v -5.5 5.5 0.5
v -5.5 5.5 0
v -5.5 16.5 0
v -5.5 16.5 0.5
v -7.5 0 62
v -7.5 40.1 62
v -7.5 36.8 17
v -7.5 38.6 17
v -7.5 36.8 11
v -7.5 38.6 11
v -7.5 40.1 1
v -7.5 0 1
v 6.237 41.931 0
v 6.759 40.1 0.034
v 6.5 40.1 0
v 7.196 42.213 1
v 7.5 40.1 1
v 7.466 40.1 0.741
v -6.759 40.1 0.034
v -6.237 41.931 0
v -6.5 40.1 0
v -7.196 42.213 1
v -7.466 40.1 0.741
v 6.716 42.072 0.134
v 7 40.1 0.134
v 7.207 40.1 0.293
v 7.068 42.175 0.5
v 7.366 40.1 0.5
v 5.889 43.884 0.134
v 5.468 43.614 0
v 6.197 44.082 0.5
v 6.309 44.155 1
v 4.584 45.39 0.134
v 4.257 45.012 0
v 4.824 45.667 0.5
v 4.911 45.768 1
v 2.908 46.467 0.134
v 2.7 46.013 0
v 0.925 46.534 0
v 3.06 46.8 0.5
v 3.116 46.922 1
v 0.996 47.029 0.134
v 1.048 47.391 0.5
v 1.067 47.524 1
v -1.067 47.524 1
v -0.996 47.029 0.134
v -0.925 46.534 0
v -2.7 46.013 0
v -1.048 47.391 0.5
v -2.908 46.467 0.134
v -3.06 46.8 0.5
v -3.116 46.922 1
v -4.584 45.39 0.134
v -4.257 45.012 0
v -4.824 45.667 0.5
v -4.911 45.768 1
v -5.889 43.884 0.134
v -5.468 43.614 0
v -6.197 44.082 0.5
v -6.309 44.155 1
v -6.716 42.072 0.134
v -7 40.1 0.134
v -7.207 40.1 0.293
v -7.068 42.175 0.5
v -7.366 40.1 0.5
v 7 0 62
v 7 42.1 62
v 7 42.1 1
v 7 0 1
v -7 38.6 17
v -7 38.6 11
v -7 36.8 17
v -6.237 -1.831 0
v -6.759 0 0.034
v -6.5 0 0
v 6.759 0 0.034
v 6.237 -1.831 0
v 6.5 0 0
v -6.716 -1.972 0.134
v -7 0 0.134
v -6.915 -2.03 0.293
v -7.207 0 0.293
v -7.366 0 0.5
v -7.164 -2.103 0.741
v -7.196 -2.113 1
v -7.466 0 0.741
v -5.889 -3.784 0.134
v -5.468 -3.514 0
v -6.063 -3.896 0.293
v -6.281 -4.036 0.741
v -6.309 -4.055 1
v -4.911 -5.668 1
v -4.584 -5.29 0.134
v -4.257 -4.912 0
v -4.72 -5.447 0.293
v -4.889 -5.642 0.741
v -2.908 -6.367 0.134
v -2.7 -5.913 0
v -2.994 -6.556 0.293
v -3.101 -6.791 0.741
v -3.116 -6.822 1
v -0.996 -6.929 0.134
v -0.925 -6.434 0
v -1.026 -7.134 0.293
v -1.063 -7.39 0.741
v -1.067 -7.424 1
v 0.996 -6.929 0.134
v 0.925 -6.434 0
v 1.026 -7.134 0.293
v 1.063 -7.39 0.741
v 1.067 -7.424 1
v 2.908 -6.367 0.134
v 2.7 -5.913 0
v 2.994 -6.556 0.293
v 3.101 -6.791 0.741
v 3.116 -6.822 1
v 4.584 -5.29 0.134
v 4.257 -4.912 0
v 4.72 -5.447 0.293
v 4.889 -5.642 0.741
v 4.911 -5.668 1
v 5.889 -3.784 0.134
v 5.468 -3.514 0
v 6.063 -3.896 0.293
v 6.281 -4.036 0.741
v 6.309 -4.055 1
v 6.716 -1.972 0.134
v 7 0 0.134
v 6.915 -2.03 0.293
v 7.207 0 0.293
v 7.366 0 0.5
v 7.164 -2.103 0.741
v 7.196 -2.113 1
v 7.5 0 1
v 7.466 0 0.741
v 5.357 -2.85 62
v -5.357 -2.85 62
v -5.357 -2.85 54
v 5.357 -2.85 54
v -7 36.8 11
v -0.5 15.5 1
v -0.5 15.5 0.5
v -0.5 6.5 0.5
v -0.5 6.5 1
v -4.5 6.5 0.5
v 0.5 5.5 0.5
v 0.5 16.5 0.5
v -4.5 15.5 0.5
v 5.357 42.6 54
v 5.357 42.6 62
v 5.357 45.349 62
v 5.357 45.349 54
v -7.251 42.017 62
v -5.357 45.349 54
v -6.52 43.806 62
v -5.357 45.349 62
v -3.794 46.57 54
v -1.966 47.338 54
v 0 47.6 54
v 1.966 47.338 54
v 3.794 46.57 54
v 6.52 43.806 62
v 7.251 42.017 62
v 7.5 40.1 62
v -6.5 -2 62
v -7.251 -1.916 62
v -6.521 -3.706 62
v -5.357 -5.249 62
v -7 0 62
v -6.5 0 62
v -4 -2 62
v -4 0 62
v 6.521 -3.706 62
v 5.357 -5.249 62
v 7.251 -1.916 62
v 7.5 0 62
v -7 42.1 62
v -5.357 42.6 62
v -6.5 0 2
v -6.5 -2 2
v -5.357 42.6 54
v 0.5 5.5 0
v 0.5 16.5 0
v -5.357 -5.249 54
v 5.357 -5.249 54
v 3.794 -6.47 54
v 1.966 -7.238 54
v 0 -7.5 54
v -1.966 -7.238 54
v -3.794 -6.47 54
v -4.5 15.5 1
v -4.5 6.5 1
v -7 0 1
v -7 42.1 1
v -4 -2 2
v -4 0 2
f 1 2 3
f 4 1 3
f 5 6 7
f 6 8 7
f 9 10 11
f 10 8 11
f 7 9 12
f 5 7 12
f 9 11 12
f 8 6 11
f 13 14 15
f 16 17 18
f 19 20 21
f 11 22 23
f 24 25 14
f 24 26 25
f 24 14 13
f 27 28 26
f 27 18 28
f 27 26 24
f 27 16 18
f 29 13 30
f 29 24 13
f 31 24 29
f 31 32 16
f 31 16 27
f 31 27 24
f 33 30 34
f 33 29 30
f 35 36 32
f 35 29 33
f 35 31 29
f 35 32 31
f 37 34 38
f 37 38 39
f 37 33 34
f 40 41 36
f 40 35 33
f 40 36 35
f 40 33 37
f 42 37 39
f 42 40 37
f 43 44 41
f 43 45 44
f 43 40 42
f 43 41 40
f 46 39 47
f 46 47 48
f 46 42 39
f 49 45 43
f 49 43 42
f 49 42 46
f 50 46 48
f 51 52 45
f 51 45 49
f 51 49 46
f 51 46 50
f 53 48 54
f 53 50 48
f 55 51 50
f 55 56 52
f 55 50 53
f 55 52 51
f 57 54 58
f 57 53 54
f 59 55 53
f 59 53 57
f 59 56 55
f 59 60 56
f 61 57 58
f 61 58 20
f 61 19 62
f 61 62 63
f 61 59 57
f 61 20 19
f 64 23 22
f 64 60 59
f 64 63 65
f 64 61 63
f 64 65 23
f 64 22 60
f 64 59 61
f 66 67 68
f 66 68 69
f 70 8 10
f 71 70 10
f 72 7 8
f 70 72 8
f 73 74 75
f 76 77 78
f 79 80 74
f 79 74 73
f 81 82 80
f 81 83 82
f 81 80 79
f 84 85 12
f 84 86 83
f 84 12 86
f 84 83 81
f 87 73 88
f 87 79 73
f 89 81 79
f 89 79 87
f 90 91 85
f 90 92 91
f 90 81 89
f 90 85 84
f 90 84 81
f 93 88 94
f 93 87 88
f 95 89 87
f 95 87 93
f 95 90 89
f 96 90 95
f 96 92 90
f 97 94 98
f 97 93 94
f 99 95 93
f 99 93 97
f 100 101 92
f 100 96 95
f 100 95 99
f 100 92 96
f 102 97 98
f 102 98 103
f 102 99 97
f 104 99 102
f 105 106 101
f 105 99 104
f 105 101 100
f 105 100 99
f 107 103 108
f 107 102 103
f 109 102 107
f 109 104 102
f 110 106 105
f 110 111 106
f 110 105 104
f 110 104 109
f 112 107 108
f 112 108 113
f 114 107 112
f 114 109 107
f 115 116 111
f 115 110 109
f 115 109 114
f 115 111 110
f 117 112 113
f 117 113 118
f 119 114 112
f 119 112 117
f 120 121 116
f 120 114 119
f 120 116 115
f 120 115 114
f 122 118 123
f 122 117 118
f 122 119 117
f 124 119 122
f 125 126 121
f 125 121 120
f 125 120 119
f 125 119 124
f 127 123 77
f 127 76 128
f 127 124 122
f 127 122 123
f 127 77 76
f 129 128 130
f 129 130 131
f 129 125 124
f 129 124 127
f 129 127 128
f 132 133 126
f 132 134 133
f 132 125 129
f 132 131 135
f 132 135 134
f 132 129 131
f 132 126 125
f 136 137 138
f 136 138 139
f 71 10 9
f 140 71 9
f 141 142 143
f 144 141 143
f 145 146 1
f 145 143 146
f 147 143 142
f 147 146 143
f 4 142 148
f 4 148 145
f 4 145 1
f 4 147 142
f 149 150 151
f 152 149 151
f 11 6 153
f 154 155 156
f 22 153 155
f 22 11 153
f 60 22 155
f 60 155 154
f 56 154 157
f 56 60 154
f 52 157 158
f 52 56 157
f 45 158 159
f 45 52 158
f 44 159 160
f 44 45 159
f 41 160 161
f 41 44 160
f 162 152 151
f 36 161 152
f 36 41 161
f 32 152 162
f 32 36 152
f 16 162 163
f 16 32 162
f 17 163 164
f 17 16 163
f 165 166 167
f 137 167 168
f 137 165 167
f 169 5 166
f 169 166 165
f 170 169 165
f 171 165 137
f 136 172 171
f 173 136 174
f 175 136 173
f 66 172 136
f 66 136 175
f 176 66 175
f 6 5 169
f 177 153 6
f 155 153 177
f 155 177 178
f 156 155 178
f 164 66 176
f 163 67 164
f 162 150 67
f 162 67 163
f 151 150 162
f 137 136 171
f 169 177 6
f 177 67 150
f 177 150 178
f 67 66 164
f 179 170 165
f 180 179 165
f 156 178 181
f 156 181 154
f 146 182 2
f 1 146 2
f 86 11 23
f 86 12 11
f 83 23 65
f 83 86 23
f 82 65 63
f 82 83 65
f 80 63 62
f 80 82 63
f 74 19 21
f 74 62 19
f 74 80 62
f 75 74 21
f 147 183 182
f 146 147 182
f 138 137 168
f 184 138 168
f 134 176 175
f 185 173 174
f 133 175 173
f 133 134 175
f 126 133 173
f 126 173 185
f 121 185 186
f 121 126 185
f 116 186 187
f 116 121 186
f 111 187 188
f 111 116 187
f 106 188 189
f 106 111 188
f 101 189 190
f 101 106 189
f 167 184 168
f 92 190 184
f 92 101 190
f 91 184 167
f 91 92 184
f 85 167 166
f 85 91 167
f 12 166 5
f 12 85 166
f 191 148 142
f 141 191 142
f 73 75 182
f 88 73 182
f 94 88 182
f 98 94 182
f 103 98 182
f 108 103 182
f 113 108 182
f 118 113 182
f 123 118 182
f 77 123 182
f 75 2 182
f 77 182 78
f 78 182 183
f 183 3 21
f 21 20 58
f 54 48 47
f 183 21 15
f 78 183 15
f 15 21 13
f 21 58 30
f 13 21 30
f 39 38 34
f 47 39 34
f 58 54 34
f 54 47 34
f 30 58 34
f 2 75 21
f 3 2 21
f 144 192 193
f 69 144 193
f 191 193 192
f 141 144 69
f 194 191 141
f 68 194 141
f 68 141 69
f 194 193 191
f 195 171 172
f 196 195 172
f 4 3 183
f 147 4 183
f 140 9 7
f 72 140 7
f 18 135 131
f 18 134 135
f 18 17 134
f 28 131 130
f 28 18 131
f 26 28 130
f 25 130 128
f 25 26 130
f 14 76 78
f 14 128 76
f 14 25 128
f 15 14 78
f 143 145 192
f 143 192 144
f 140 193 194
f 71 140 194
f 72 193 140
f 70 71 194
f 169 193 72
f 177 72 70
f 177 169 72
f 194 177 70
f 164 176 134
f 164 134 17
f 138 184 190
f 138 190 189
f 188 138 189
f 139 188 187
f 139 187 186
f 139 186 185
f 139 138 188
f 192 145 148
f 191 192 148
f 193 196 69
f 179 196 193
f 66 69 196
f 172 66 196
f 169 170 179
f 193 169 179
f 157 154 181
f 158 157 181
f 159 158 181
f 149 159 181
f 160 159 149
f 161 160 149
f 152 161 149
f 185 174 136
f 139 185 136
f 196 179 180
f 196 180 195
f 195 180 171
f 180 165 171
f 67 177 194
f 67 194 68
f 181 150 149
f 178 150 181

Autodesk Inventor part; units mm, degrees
ref_plane "YZ Plane" through (0, 0, 0) normal (1, 0, 0) x (0, 1, 0)
ref_plane "XZ Plane" through (0, 0, 0) normal (0, 1, 0) x (-1, 0, 0)
ref_plane "XY Plane" through (0, 0, 0) normal (0, 0, 1) x (1, 0, 0)
sketch "Boceto1" plane through (0, 0, 0) normal (0, 0, 1) x (1, 0, 0)
  line L0 (0, 0) -> (0, 40.1) construction
  line L1 (7.5, 0) -> (7.5, 40.1)
  line L2 (-7.5, 40.1) -> (-7.5, 0)
  arc A0 (-7.5, 0) -> (7.5, 0) centre (0, 0) ccw
  arc A1 (7.5, 40.1) -> (-7.5, 40.1) centre (0, 40.1) ccw
  point P0 (0, 20.05)
  dimension "d0" = 40.1
  dimension "d1" = 15
extrude "Extrusión1" add sketch "Boceto1" along normal blind 62
sketch "Boceto2" plane through (0, 0, 62) normal (0, 0, 1) x (1, 0, 0)
  line L0 (0, 0) -> (-7, 0)
  line L1 (-7, 0) -> (-7, 40.0875)
  line L2 (-7.5, 40.1) -> (-7.5, 0) projected
  line L3 (7, 0) -> (-7, 0)
  line L4 (-7, 40.0875) -> (-7, 42.1)
  arc A0 (7.5, 40.1) -> (-7.5, 40.1) centre (0, 40.1) ccw projected
  line L5 (-7, 42.1) -> (7, 42.1)
  line L6 (7, 42.1) -> (7, 0)
  dimension "d4" = 7
  dimension "d68" = 7
  dimension "d69" = 14
extrude "Extrusión2" cut sketch "Boceto2" against normal blind 61
sketch "Boceto3" plane through (0, 0, 62) normal (0, 0, 1) x (1, 0, 0)
  line L0 (-5.3571, -2.8499) -> (5.3571, -2.8499)
  line L1 (-6.5, 40.1) -> (6.5, 40.1) projected
  line L2 (-5, 42.6) -> (5, 42.6)
  line L3 (-5.3571, -2.8499) -> (-5.3571, -4.1499)
  line L4 (5.3571, -5.2489) -> (5.3571, -2.8499)
  arc A0 (7.5, 40.1) -> (-7.5, 40.1) centre (0, 40.1) ccw projected
  arc A1 (-5.3571, -5.2489) -> (5.3571, -5.2489) centre (0, 0) ccw
  line L5 (-5.3571, -4.1499) -> (-5.3571, -5.2489)
  arc A2 (-7.5, 0) -> (7.5, 0) centre (0, 0) ccw projected
  arc A3 (5.357, 45.3491) -> (-5.357, 45.3491) centre (0, 40.1) ccw
  line L6 (0, 42.6) -> (-5.357, 42.6)
  line L7 (-5.357, 42.6) -> (-5.357, 45.3491)
  line L8 (0, 42.6) -> (5.357, 42.6)
  line L9 (5.357, 42.6) -> (5.357, 45.3491)
  line L10 (0, -2.8499) -> (-5.357, -2.8499)
  point P0 (5.3571, -4.1499)
  point P1 (5, 43.9)
  dimension "d46" = 1.3
  dimension "d70" = 5.357
  dimension "d71" = 5.357
  dimension "d72" = 5.357
extrude "Extrusión3" cut sketch "Boceto3" against normal blind 8
fillet "Empalme1" radius 1 4 edges at (0, 47.6, 0) (-7.5, 20.05, 0) (0, -7.5, 0) (7.5, 20.05, 0)
sketch "Boceto5" plane through (0, 0, 62) normal (0, 0, 1) x (1, 0, 0)
  line L0 (7, 0) -> (-7, 0) projected
  line L1 (7, 0) -> (-3.5, 0)
  line L2 (5, -1) -> (-5, -1) projected
  line L3 (-3.5, -0.9) -> (-2, -0.9) construction
  arc A0 (-6.5, 0) -> (6.5, 0) centre (0, 0) ccw projected
  line L4 (-6.5, 0) -> (-3.5, 0)
  line L5 (-6.5, 0) -> (-6.5, -2)
  line L6 (-6.5, -2) -> (-5, -2)
  line L7 (-5, -2) -> (-4, -2)
  line L8 (-4, -2) -> (-4, 0)
  line L9 (7, 0) -> (-7, 0) projected
  dimension "d49" = 2
  dimension "d51" = 1
extrude "Extrusión5" cut sketch "Boceto5" against normal blind 60 contours L6 L5 A0 | A0 L0 L8 L7 L6 picked at (-5.1549, -1.2255)
sketch "Boceto6" plane through (0, 0, 0) normal (0, 0, -1) x (-1, 0, 0)
  line L0 (-7, 0) -> (7, 0) projected
  line L1 (3.5, 0) -> (3.5, 6.5)
  line L2 (6.5, 40.1) -> (-6.5, 40.1) projected
  line L3 (-0.5, 0) -> (3.5, 0)
  line L4 (7, 0) -> (7, 42.1) projected
  line L5 (6.5, 40.1) -> (6.5, 0) projected
  line L6 (4.5, 6.5) -> (4.5, 15.5)
  line L7 (4.5, 15.5) -> (0.5, 15.5)
  line L8 (0.5, 15.5) -> (0.5, 6.5)
  line L9 (-0.5, 0) -> (0.5, 0)
  line L10 (-7, 0) -> (7, 0) projected
  line L11 (0.5, 0) -> (0.5, 6.5)
  line L12 (4.5, 6.5) -> (0.5, 6.5)
  point P0 (0, 0)
  point P1 (7, 42.1)
  dimension "d44" = 9
  dimension "d60" = 1
extrude "Extrusión6" cut sketch "Boceto6" against normal through all contours L8 L7 L6 L12
sketch "Boceto7" plane through (-7.5, 0, 62) normal (-1, 0, 0) x (0, 0, 1)
  line L0 (-45, 36.8) -> (-45, 38.6)
  line L1 (-45, 38.6) -> (-51, 38.6)
  line L2 (-51, 38.6) -> (-51, 36.8)
  line L3 (-51, 36.8) -> (-45, 36.8)
  point P0 (-62, 0)
  dimension "d74" = 6
extrude "Extrusión7" cut sketch "Boceto7" against normal blind 3
sketch "Boceto8" plane through (0, 0, 0) normal (0, 0, -1) x (-1, 0, 0)
  line L0 (0.5, 6.5) -> (0.5, 15.5) projected
  line L1 (4.5, 15.5) -> (4.5, 6.5) projected
  line L2 (0.5, 15.5) -> (4.5, 15.5)
  line L3 (4.5, 15.5) -> (4.5, 6.5)
  line L4 (4.5, 6.5) -> (0.5, 6.5)
  line L5 (0.5, 6.5) -> (0.5, 15.5)
  line L6 (5.5, 16.5) -> (-0.5, 16.5)
  line L7 (-0.5, 16.5) -> (-0.5, 5.5)
  line L8 (-0.5, 5.5) -> (5.5, 5.5)
  line L9 (5.5, 5.5) -> (5.5, 16.5)
  point P0 (0, 0)
  dimension "d61" = 1
extrude "Extrusión8" cut sketch "Boceto8" against normal blind 0.5 contours L0 L2 L1 L4 | L9 L8 L7 L6
sketch "Boceto9" plane through (-7.5, 0, 62) normal (-1, 0, 0) x (0, 0, 1)
  point P0 (-62, 0)
properties part number "Carcasa Luis"
